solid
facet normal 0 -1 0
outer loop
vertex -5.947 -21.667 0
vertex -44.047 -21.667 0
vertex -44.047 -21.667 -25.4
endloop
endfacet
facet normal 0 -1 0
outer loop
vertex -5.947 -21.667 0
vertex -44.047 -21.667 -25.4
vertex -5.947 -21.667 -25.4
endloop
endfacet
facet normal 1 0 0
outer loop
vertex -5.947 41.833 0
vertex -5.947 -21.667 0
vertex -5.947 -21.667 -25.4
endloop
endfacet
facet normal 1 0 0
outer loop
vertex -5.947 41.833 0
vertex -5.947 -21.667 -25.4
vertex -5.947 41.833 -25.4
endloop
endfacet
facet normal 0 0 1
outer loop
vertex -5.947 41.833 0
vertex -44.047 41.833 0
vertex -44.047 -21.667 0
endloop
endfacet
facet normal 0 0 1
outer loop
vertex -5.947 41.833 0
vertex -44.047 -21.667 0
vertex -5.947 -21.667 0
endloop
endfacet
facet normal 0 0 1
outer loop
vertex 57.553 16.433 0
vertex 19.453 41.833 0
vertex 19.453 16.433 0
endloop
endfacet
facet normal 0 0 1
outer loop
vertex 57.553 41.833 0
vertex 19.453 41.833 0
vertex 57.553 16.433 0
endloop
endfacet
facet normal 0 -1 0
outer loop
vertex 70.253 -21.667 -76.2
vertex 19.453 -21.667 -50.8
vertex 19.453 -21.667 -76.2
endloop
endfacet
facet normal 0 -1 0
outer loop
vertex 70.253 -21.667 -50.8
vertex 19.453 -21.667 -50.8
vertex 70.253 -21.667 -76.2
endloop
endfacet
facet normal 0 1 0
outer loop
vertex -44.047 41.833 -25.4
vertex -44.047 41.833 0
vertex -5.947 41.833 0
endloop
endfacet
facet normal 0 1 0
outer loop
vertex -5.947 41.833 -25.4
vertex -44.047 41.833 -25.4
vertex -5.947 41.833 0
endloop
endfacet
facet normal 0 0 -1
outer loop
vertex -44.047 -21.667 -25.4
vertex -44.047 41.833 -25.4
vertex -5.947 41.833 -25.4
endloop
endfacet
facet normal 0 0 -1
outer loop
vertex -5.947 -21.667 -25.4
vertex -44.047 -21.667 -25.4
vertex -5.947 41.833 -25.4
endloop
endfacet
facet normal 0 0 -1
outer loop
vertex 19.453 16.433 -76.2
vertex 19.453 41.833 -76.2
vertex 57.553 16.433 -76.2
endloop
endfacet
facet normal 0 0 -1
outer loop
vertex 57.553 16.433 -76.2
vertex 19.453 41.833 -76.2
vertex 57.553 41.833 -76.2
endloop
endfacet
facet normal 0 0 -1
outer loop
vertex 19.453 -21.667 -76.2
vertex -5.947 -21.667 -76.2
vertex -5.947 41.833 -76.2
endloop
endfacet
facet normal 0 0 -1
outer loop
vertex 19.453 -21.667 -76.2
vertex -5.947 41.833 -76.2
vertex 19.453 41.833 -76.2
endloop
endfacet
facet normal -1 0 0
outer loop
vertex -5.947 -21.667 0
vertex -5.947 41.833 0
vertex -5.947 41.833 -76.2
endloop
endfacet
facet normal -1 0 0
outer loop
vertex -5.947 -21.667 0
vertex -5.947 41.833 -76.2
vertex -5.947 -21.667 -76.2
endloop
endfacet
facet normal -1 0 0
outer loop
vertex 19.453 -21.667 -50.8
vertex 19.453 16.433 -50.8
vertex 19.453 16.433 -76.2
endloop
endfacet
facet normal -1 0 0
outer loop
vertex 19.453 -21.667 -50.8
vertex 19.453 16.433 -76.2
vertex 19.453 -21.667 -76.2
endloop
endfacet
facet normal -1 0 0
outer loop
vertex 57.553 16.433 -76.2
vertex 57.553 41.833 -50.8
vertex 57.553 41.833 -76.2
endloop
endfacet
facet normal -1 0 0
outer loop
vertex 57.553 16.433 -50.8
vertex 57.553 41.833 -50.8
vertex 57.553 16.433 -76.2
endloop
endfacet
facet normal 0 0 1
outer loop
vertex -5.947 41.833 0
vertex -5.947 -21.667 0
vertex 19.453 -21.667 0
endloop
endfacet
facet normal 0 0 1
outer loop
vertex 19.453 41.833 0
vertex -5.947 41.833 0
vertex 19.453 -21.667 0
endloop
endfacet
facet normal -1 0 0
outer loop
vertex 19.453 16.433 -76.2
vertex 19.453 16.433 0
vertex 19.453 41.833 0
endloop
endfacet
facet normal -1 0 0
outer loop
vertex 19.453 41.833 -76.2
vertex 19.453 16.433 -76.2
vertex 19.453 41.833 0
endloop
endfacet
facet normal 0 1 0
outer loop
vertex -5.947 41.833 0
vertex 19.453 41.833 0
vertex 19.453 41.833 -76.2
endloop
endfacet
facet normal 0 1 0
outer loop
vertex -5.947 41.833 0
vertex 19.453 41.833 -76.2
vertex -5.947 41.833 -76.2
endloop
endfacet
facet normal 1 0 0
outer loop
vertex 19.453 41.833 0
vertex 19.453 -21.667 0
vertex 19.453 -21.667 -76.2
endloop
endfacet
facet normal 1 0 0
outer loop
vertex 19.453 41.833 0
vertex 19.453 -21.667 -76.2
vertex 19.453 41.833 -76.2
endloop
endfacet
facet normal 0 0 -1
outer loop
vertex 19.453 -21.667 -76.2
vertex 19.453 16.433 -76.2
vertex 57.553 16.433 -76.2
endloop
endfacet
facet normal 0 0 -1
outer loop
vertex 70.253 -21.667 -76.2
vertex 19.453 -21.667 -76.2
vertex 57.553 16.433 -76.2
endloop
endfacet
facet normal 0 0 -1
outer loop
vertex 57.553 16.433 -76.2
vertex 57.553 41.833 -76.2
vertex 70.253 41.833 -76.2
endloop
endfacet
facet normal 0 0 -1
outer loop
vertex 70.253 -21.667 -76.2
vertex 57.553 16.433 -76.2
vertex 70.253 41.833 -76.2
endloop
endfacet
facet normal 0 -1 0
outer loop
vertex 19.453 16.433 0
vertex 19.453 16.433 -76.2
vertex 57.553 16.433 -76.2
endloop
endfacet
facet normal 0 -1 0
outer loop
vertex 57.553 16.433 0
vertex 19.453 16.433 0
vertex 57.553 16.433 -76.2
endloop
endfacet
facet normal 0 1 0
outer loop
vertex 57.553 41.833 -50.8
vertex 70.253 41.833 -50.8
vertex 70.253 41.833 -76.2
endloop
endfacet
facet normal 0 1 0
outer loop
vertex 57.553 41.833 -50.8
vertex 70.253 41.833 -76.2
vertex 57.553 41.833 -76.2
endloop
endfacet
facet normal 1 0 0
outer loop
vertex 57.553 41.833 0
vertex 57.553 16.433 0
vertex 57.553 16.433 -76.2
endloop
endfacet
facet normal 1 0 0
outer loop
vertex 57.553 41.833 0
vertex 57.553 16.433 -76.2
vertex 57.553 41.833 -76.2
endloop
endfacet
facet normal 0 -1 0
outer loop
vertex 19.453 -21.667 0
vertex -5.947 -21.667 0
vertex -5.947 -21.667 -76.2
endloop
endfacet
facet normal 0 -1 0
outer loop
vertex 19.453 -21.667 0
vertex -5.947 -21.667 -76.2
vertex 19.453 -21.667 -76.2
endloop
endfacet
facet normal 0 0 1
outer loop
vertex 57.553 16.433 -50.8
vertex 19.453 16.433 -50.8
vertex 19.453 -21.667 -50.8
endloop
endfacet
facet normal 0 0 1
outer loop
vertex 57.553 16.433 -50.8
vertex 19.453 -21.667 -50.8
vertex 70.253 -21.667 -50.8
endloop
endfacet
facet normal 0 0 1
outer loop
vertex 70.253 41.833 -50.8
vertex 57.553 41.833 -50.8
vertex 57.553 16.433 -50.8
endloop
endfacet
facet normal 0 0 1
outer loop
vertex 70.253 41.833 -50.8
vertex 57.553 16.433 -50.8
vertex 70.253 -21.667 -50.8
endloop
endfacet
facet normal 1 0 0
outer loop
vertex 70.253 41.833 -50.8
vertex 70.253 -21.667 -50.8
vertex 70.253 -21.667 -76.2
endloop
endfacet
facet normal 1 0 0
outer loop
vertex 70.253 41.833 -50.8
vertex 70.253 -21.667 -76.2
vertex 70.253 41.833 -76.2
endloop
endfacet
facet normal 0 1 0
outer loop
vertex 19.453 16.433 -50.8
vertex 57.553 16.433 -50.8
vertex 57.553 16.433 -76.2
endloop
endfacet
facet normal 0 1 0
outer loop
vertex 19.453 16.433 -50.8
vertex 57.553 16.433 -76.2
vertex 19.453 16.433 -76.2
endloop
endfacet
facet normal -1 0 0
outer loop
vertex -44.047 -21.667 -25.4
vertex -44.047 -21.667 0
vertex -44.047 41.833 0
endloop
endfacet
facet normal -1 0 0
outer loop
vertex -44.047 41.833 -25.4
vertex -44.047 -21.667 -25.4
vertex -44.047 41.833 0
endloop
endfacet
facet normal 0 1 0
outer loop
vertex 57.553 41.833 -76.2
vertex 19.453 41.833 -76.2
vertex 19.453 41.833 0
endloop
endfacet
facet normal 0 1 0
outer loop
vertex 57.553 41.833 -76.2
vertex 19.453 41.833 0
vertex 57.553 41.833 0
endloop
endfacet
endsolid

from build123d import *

# Parameters (mm, degrees)
F0_W     = 38.1
F0_H     = 63.5
F1_DEPTH = 25.4
F0_H_2   = 25.4
F2_DEPTH = 76.2
F3_DEPTH = 76.2
F4_DEPTH = 76.2
F5_DEPTH = 50.8


with BuildPart() as f1:
    # F0 (on Top) → F1 (new body)
    with BuildSketch(Plane.XY):
        with Locations((-24.9969350107, 10.0831652018)):
            Rectangle(F0_W, F0_H)
    extrude(amount=-F1_DEPTH)


with BuildPart() as f2:
    # F0 (on Top) → F2 (new body)
    with BuildSketch(Plane.XY):
        with Locations((38.5030649893, 29.1331652018)):
            Rectangle(F0_W, F0_H_2)
    extrude(amount=-F2_DEPTH)


with BuildPart() as f3:
    # F0 (on Top) → F3 (new body)
    with BuildSketch(Plane.XY):
        Polygon((19.4530649893, 41.8331652018), (-5.9469350107, 41.8331652018), (-5.9469350107, -21.6668347982), (19.4530649893, -21.6668347982), (19.4530649893, 16.4331652018), align=None)
    extrude(amount=-F3_DEPTH)


with BuildPart() as f4:
    # F0 (on Top) → F4 (new body)
    with BuildSketch(Plane.XY):
        Polygon((70.2530649893, 41.8331652018), (57.5530649893, 41.8331652018), (57.5530649893, 16.4331652018), (19.4530649893, 16.4331652018), (19.4530649893, -21.6668347982), (70.2530649893, -21.6668347982), (70.2530649893, 16.4331652018), align=None)
    extrude(amount=-F4_DEPTH)

    # F0 (on Top) → F5 (cut)
    with BuildSketch(Plane.XY):
        Polygon((70.2530649893, 41.8331652018), (57.5530649893, 41.8331652018), (57.5530649893, 16.4331652018), (19.4530649893, 16.4331652018), (19.4530649893, -21.6668347982), (70.2530649893, -21.6668347982), (70.2530649893, 16.4331652018), align=None)
    extrude(amount=-F5_DEPTH, mode=Mode.SUBTRACT)


solid = Compound([f1.part, f2.part, f3.part, f4.part])
